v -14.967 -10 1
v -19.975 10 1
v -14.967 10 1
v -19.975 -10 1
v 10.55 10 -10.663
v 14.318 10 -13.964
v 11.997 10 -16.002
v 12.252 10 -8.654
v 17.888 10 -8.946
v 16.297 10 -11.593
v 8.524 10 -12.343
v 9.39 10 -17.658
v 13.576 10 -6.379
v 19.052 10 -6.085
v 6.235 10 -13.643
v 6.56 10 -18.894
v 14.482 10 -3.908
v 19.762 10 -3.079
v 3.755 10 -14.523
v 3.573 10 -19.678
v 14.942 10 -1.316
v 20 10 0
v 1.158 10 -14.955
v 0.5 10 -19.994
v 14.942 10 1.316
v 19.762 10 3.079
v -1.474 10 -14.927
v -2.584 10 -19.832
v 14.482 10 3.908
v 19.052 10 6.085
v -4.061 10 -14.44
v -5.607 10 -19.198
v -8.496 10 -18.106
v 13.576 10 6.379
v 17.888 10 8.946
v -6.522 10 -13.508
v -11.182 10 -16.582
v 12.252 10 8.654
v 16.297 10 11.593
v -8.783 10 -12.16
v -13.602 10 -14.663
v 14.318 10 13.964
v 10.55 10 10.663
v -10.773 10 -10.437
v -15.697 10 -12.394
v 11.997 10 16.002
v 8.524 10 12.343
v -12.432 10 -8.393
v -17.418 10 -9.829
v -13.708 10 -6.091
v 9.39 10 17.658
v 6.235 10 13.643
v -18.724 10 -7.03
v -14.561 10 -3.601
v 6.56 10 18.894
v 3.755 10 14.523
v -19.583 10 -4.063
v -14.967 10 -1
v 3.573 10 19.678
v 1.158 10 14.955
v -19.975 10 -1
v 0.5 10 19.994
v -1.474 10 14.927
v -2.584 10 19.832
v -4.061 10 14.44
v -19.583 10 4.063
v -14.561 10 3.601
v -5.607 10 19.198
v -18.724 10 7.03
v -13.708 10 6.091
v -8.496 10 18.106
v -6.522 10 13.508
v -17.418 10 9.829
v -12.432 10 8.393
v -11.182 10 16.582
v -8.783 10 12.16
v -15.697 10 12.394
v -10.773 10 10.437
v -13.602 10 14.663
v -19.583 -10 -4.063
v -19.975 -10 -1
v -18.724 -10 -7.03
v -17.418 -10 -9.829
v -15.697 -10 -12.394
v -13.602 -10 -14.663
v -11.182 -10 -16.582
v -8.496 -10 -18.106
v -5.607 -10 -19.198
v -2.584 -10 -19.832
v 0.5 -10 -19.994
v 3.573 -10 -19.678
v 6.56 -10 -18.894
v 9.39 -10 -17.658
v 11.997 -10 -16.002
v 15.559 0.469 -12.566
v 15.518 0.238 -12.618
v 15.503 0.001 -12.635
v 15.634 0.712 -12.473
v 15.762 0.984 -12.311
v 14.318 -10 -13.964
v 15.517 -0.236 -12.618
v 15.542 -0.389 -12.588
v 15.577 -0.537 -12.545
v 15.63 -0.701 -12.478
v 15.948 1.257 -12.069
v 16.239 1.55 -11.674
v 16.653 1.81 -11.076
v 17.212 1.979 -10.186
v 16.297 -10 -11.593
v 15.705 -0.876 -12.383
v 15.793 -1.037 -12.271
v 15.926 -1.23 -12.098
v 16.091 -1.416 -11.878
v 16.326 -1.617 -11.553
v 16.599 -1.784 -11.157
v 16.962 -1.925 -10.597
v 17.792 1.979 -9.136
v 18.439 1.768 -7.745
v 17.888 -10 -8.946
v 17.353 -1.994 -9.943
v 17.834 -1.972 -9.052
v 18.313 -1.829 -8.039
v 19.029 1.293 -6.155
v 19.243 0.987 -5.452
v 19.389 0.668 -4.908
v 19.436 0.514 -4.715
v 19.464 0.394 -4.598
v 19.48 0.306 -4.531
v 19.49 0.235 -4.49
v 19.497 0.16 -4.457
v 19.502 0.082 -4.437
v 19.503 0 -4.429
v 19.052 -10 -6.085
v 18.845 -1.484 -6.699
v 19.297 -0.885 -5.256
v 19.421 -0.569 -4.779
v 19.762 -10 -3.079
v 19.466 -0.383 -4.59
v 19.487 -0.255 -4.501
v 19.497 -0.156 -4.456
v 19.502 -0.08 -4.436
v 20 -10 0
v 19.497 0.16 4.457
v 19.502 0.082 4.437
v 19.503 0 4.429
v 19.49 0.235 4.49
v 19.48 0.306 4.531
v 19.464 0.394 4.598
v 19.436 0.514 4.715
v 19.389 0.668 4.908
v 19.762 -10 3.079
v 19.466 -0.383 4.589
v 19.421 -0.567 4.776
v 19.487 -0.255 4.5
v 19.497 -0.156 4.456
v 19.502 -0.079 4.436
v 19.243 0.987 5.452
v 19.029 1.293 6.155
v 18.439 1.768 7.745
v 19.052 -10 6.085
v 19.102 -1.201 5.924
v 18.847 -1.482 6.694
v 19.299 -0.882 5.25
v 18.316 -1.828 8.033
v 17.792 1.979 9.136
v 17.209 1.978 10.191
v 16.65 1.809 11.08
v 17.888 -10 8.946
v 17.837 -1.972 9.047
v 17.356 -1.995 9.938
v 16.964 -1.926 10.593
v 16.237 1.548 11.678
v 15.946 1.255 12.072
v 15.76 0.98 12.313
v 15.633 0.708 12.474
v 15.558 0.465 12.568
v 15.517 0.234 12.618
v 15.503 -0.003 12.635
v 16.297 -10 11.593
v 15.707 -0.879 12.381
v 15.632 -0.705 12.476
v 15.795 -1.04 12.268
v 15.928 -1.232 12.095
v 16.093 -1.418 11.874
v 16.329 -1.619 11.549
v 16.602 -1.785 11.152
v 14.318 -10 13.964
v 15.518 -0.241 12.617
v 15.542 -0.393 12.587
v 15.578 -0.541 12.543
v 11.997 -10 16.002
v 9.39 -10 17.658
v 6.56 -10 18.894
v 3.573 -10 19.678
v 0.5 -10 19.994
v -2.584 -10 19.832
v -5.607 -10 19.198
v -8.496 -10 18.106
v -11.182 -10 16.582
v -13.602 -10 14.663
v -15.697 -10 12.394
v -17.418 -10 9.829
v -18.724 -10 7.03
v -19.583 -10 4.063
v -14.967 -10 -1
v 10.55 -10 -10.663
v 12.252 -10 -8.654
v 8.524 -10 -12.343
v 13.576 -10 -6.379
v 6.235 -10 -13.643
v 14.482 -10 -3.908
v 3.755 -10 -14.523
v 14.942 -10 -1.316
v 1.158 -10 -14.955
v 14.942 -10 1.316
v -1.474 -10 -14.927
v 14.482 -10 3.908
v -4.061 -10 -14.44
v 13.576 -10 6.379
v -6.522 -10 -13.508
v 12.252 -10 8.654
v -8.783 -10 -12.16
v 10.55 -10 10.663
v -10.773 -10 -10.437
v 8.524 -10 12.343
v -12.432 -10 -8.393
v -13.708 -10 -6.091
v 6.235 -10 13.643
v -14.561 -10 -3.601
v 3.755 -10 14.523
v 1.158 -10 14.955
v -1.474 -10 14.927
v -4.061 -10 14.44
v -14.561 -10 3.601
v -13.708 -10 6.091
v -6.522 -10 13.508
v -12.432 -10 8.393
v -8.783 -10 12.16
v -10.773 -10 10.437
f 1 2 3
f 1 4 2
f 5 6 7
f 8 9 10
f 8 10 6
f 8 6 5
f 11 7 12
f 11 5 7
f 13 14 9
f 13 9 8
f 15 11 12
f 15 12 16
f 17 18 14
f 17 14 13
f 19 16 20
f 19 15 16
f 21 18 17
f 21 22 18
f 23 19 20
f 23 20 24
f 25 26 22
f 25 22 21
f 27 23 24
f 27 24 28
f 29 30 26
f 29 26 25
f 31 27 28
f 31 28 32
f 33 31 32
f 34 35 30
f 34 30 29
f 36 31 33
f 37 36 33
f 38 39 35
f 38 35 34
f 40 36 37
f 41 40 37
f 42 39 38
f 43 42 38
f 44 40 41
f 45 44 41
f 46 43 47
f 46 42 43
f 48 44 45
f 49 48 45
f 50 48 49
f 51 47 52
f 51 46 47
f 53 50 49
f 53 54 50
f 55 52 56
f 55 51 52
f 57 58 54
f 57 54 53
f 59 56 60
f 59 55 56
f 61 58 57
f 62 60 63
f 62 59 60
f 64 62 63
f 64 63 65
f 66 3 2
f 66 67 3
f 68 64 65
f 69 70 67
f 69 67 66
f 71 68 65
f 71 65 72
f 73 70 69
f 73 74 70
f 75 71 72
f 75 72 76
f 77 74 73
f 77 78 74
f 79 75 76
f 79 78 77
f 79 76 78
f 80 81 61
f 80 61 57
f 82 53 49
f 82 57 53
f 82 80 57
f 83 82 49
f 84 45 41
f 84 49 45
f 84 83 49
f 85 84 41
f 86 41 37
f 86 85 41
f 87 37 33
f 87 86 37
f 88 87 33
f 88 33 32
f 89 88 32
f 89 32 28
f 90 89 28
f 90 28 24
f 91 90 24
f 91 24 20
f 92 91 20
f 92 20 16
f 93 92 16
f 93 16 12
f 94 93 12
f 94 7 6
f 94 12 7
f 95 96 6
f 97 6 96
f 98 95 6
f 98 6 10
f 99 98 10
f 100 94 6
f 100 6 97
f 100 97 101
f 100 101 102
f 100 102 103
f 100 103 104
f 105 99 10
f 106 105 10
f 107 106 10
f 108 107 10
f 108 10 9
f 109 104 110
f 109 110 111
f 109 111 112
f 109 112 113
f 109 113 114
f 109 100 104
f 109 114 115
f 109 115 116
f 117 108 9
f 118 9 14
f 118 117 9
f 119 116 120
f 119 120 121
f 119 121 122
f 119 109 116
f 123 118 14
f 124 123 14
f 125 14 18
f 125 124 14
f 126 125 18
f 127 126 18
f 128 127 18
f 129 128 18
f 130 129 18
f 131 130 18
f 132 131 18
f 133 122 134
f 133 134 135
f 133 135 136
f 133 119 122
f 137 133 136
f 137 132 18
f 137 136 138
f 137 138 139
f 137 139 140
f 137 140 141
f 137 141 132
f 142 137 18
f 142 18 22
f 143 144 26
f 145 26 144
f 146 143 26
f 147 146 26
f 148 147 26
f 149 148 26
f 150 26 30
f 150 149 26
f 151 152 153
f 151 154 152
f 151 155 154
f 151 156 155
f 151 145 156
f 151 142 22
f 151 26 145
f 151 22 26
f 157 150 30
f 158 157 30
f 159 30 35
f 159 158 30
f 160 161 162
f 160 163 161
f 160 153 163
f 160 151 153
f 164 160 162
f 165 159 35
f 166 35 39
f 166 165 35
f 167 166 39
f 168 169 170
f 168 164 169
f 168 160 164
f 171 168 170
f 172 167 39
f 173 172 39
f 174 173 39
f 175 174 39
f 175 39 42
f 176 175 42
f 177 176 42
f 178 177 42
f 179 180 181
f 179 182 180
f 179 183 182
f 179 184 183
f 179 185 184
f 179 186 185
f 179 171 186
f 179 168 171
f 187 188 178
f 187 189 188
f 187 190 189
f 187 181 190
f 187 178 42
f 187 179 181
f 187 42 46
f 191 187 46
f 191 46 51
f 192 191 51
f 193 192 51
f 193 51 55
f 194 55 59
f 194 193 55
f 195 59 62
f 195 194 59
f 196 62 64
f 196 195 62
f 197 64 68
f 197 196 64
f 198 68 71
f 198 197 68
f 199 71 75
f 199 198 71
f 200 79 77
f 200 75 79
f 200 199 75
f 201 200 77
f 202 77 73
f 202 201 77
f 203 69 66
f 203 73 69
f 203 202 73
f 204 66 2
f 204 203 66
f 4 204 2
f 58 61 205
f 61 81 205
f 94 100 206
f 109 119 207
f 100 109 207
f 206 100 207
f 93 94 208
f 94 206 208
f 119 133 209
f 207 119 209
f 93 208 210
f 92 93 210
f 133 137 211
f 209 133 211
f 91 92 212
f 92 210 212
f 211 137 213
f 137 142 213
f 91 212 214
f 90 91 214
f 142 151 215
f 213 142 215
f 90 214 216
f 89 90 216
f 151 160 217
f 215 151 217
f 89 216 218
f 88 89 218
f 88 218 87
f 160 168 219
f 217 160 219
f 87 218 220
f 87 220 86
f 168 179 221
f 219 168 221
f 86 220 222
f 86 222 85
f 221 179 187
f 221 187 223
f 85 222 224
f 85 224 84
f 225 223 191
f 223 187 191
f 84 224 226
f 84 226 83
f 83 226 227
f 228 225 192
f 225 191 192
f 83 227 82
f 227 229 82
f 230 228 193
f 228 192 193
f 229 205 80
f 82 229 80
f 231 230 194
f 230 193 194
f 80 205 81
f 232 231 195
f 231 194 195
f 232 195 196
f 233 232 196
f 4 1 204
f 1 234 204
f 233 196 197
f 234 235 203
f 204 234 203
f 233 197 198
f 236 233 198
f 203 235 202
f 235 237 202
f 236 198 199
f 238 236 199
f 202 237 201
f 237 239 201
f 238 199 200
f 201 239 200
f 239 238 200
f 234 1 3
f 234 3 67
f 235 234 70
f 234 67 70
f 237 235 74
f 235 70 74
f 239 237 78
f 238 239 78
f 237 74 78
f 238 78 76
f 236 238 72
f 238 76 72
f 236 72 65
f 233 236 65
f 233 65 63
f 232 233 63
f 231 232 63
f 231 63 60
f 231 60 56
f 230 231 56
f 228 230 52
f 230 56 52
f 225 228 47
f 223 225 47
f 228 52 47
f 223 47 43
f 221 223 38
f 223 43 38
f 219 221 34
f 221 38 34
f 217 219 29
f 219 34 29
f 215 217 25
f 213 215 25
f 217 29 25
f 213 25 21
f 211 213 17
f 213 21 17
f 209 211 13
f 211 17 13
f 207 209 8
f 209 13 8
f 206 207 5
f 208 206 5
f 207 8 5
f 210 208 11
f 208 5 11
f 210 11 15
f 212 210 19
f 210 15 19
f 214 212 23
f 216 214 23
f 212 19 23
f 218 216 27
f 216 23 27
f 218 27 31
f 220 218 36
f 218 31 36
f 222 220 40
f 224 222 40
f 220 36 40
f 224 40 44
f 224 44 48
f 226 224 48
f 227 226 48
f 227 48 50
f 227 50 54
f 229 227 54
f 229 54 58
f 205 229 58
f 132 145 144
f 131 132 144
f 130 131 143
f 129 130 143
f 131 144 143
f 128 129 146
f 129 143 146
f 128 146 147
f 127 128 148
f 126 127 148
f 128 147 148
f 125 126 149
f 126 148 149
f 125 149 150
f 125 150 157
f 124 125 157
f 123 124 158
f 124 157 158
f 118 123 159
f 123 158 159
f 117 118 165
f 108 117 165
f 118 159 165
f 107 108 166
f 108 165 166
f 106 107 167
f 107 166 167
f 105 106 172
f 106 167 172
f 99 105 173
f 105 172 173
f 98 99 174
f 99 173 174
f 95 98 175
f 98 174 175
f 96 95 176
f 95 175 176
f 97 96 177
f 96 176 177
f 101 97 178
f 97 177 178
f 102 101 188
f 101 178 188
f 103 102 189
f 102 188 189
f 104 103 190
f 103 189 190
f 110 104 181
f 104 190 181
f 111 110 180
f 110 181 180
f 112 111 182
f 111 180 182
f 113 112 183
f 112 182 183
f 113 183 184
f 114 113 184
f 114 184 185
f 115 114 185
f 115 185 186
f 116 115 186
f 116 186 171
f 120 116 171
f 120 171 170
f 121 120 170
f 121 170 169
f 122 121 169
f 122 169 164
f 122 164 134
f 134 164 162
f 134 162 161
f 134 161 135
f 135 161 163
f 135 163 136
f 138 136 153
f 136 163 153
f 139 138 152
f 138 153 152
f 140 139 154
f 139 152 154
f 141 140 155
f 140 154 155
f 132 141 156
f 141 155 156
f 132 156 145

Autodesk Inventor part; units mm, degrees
ref_plane "YZ Plane" through (0, 0, 0) normal (1, 0, 0) x (0, 1, 0)
ref_plane "XZ Plane" through (0, 0, 0) normal (0, 1, 0) x (-1, 0, 0)
sketch "草圖1" plane through (0, 0, 0) normal (0, 1, 0) x (-1, 0, 0)
  circle A0 centre (0, 0) radius 15
  circle A1 centre (0, 0) radius 20
  dimension "d0" = 30
  dimension "d1" = 5
extrude "擠出1" add sketch "草圖1" along normal mid plane 20
sketch "草圖2" plane through (0, 0, 0) normal (0, 0, 1) x (1, 0, 0)
  circle A0 centre (0, 0) radius 3
  dimension "d4" = 6
sketch "草圖3" plane through (0, 0, 0) normal (0, 0, 1) x (1, 0, 0)
  line L0 (-20, -10) -> (20, -10) projected
  line L1 (20, 10) -> (-20, 10) projected
  circle A0 centre (17.5034, 0) radius 1
  line L2 (20, 10) -> (20, -10)
  line L3 (20, -10) -> (20, 10) projected
  line L4 (20, 10) -> (-20, 10) projected
  line L5 (15.0068, 10) -> (20, 10)
  point P0 (0, 0)
  point P1 (20, 0)
  point P2 (17.5034, 10)
  dimension "d5" = 2
extrude "擠出2" cut sketch "草圖3" along normal through all both and the other way through all
sketch "草圖4" plane through (0, 0, 0) normal (0, 1, 0) x (-1, 0, 0)
  circle A0 centre (0, 0) radius 20 projected
  circle A1 centre (0, 0) radius 15 projected
  circle A2 centre (0, 0) radius 20 projected
  line L0 (19.975, -1) -> (14.9666, -1)
  circle A3 centre (0, 0) radius 15 projected
  line L1 (28, 0) -> (-28, 0) projected
  line L2 (19.975, 1) -> (14.9666, 1)
  dimension "d8" = 1
extrude "擠出3" cut sketch "草圖4" along normal through all both and the other way through all contours L1 A1 L2 A0 | A0 L0 A1 L1 picked at (16.6568, 0.5558) picked at (16.6568, -0.5558)
ref_plane "工作平面1" through (0, 0, 3) normal (0, 0, 1) x (1, 0, 0)
sketch "草圖5" plane through (0, 0, 3) normal (0, 0, 1) x (1, 0, 0)
  line L0 (-19.975, 10) -> (-19.975, -10) projected
  line L1 (-19.975, -10) -> (-19.975, -10) projected
  line L2 (-19.975, -10) -> (-19.975, 10) projected
  line L3 (-19.975, 10) -> (-19.975, 10) projected
  spline S0 degree 5 poles (16.5034, 0) (16.5037, -0.3304) (16.6391, -0.6617) (16.9151, -0.9151) (17.5618, -1.1213) (18.1683, -0.8385) (18.3912, -0.5976) (18.6137, -0.0031) (18.395, 0.593) (18.1721, 0.8363) (17.5647, 1.1217) (16.9159, 0.9158) (16.6393, 0.6625) (16.5037, 0.3307) (16.5034, 0) knots 0 0 0 0 0 0 0.26304 0.26304 0.26304 0.499355 0.499355 0.499355 0.736707 0.736707 0.736707 1 1 1 1 1 1 projected
  line L4 (19.7737, 10) -> (19.7737, -10) projected
  line L5 (19.7737, -10) -> (14.6969, -10) projected
  line L6 (14.6969, -10) -> (14.6969, 10) projected
  line L7 (14.6969, 10) -> (19.7737, 10) projected
  circle A0 centre (17.5034, 0) radius 1 projected
  line L8 (-19.7737, -10) -> (-19.7737, 10) projected
  line L9 (-19.7737, 10) -> (-14.6969, 10) projected
  line L10 (-14.6969, 10) -> (-14.6969, -10) projected
  line L11 (-14.6969, -10) -> (-19.7737, -10) projected
  line L12 (14.6969, 10) -> (19.7737, 10)
  line L13 (19.7737, 10) -> (19.7737, -10)
  line L14 (19.7737, -10) -> (14.6969, -10)
  line L15 (14.6969, -10) -> (14.6969, 10)
  circle A1 centre (17.5034, 0) radius 2
  point P0 (0, 0)
  point P1 (18.3303, -0.5624)
  point P2 (19.7737, 0)
  point P3 (17.2353, 10)
  dimension "d15" = 4
extrude "擠出5" cut sketch "草圖5" along normal through all both and the other way through all contours A1
properties part number "0311_練習2"
